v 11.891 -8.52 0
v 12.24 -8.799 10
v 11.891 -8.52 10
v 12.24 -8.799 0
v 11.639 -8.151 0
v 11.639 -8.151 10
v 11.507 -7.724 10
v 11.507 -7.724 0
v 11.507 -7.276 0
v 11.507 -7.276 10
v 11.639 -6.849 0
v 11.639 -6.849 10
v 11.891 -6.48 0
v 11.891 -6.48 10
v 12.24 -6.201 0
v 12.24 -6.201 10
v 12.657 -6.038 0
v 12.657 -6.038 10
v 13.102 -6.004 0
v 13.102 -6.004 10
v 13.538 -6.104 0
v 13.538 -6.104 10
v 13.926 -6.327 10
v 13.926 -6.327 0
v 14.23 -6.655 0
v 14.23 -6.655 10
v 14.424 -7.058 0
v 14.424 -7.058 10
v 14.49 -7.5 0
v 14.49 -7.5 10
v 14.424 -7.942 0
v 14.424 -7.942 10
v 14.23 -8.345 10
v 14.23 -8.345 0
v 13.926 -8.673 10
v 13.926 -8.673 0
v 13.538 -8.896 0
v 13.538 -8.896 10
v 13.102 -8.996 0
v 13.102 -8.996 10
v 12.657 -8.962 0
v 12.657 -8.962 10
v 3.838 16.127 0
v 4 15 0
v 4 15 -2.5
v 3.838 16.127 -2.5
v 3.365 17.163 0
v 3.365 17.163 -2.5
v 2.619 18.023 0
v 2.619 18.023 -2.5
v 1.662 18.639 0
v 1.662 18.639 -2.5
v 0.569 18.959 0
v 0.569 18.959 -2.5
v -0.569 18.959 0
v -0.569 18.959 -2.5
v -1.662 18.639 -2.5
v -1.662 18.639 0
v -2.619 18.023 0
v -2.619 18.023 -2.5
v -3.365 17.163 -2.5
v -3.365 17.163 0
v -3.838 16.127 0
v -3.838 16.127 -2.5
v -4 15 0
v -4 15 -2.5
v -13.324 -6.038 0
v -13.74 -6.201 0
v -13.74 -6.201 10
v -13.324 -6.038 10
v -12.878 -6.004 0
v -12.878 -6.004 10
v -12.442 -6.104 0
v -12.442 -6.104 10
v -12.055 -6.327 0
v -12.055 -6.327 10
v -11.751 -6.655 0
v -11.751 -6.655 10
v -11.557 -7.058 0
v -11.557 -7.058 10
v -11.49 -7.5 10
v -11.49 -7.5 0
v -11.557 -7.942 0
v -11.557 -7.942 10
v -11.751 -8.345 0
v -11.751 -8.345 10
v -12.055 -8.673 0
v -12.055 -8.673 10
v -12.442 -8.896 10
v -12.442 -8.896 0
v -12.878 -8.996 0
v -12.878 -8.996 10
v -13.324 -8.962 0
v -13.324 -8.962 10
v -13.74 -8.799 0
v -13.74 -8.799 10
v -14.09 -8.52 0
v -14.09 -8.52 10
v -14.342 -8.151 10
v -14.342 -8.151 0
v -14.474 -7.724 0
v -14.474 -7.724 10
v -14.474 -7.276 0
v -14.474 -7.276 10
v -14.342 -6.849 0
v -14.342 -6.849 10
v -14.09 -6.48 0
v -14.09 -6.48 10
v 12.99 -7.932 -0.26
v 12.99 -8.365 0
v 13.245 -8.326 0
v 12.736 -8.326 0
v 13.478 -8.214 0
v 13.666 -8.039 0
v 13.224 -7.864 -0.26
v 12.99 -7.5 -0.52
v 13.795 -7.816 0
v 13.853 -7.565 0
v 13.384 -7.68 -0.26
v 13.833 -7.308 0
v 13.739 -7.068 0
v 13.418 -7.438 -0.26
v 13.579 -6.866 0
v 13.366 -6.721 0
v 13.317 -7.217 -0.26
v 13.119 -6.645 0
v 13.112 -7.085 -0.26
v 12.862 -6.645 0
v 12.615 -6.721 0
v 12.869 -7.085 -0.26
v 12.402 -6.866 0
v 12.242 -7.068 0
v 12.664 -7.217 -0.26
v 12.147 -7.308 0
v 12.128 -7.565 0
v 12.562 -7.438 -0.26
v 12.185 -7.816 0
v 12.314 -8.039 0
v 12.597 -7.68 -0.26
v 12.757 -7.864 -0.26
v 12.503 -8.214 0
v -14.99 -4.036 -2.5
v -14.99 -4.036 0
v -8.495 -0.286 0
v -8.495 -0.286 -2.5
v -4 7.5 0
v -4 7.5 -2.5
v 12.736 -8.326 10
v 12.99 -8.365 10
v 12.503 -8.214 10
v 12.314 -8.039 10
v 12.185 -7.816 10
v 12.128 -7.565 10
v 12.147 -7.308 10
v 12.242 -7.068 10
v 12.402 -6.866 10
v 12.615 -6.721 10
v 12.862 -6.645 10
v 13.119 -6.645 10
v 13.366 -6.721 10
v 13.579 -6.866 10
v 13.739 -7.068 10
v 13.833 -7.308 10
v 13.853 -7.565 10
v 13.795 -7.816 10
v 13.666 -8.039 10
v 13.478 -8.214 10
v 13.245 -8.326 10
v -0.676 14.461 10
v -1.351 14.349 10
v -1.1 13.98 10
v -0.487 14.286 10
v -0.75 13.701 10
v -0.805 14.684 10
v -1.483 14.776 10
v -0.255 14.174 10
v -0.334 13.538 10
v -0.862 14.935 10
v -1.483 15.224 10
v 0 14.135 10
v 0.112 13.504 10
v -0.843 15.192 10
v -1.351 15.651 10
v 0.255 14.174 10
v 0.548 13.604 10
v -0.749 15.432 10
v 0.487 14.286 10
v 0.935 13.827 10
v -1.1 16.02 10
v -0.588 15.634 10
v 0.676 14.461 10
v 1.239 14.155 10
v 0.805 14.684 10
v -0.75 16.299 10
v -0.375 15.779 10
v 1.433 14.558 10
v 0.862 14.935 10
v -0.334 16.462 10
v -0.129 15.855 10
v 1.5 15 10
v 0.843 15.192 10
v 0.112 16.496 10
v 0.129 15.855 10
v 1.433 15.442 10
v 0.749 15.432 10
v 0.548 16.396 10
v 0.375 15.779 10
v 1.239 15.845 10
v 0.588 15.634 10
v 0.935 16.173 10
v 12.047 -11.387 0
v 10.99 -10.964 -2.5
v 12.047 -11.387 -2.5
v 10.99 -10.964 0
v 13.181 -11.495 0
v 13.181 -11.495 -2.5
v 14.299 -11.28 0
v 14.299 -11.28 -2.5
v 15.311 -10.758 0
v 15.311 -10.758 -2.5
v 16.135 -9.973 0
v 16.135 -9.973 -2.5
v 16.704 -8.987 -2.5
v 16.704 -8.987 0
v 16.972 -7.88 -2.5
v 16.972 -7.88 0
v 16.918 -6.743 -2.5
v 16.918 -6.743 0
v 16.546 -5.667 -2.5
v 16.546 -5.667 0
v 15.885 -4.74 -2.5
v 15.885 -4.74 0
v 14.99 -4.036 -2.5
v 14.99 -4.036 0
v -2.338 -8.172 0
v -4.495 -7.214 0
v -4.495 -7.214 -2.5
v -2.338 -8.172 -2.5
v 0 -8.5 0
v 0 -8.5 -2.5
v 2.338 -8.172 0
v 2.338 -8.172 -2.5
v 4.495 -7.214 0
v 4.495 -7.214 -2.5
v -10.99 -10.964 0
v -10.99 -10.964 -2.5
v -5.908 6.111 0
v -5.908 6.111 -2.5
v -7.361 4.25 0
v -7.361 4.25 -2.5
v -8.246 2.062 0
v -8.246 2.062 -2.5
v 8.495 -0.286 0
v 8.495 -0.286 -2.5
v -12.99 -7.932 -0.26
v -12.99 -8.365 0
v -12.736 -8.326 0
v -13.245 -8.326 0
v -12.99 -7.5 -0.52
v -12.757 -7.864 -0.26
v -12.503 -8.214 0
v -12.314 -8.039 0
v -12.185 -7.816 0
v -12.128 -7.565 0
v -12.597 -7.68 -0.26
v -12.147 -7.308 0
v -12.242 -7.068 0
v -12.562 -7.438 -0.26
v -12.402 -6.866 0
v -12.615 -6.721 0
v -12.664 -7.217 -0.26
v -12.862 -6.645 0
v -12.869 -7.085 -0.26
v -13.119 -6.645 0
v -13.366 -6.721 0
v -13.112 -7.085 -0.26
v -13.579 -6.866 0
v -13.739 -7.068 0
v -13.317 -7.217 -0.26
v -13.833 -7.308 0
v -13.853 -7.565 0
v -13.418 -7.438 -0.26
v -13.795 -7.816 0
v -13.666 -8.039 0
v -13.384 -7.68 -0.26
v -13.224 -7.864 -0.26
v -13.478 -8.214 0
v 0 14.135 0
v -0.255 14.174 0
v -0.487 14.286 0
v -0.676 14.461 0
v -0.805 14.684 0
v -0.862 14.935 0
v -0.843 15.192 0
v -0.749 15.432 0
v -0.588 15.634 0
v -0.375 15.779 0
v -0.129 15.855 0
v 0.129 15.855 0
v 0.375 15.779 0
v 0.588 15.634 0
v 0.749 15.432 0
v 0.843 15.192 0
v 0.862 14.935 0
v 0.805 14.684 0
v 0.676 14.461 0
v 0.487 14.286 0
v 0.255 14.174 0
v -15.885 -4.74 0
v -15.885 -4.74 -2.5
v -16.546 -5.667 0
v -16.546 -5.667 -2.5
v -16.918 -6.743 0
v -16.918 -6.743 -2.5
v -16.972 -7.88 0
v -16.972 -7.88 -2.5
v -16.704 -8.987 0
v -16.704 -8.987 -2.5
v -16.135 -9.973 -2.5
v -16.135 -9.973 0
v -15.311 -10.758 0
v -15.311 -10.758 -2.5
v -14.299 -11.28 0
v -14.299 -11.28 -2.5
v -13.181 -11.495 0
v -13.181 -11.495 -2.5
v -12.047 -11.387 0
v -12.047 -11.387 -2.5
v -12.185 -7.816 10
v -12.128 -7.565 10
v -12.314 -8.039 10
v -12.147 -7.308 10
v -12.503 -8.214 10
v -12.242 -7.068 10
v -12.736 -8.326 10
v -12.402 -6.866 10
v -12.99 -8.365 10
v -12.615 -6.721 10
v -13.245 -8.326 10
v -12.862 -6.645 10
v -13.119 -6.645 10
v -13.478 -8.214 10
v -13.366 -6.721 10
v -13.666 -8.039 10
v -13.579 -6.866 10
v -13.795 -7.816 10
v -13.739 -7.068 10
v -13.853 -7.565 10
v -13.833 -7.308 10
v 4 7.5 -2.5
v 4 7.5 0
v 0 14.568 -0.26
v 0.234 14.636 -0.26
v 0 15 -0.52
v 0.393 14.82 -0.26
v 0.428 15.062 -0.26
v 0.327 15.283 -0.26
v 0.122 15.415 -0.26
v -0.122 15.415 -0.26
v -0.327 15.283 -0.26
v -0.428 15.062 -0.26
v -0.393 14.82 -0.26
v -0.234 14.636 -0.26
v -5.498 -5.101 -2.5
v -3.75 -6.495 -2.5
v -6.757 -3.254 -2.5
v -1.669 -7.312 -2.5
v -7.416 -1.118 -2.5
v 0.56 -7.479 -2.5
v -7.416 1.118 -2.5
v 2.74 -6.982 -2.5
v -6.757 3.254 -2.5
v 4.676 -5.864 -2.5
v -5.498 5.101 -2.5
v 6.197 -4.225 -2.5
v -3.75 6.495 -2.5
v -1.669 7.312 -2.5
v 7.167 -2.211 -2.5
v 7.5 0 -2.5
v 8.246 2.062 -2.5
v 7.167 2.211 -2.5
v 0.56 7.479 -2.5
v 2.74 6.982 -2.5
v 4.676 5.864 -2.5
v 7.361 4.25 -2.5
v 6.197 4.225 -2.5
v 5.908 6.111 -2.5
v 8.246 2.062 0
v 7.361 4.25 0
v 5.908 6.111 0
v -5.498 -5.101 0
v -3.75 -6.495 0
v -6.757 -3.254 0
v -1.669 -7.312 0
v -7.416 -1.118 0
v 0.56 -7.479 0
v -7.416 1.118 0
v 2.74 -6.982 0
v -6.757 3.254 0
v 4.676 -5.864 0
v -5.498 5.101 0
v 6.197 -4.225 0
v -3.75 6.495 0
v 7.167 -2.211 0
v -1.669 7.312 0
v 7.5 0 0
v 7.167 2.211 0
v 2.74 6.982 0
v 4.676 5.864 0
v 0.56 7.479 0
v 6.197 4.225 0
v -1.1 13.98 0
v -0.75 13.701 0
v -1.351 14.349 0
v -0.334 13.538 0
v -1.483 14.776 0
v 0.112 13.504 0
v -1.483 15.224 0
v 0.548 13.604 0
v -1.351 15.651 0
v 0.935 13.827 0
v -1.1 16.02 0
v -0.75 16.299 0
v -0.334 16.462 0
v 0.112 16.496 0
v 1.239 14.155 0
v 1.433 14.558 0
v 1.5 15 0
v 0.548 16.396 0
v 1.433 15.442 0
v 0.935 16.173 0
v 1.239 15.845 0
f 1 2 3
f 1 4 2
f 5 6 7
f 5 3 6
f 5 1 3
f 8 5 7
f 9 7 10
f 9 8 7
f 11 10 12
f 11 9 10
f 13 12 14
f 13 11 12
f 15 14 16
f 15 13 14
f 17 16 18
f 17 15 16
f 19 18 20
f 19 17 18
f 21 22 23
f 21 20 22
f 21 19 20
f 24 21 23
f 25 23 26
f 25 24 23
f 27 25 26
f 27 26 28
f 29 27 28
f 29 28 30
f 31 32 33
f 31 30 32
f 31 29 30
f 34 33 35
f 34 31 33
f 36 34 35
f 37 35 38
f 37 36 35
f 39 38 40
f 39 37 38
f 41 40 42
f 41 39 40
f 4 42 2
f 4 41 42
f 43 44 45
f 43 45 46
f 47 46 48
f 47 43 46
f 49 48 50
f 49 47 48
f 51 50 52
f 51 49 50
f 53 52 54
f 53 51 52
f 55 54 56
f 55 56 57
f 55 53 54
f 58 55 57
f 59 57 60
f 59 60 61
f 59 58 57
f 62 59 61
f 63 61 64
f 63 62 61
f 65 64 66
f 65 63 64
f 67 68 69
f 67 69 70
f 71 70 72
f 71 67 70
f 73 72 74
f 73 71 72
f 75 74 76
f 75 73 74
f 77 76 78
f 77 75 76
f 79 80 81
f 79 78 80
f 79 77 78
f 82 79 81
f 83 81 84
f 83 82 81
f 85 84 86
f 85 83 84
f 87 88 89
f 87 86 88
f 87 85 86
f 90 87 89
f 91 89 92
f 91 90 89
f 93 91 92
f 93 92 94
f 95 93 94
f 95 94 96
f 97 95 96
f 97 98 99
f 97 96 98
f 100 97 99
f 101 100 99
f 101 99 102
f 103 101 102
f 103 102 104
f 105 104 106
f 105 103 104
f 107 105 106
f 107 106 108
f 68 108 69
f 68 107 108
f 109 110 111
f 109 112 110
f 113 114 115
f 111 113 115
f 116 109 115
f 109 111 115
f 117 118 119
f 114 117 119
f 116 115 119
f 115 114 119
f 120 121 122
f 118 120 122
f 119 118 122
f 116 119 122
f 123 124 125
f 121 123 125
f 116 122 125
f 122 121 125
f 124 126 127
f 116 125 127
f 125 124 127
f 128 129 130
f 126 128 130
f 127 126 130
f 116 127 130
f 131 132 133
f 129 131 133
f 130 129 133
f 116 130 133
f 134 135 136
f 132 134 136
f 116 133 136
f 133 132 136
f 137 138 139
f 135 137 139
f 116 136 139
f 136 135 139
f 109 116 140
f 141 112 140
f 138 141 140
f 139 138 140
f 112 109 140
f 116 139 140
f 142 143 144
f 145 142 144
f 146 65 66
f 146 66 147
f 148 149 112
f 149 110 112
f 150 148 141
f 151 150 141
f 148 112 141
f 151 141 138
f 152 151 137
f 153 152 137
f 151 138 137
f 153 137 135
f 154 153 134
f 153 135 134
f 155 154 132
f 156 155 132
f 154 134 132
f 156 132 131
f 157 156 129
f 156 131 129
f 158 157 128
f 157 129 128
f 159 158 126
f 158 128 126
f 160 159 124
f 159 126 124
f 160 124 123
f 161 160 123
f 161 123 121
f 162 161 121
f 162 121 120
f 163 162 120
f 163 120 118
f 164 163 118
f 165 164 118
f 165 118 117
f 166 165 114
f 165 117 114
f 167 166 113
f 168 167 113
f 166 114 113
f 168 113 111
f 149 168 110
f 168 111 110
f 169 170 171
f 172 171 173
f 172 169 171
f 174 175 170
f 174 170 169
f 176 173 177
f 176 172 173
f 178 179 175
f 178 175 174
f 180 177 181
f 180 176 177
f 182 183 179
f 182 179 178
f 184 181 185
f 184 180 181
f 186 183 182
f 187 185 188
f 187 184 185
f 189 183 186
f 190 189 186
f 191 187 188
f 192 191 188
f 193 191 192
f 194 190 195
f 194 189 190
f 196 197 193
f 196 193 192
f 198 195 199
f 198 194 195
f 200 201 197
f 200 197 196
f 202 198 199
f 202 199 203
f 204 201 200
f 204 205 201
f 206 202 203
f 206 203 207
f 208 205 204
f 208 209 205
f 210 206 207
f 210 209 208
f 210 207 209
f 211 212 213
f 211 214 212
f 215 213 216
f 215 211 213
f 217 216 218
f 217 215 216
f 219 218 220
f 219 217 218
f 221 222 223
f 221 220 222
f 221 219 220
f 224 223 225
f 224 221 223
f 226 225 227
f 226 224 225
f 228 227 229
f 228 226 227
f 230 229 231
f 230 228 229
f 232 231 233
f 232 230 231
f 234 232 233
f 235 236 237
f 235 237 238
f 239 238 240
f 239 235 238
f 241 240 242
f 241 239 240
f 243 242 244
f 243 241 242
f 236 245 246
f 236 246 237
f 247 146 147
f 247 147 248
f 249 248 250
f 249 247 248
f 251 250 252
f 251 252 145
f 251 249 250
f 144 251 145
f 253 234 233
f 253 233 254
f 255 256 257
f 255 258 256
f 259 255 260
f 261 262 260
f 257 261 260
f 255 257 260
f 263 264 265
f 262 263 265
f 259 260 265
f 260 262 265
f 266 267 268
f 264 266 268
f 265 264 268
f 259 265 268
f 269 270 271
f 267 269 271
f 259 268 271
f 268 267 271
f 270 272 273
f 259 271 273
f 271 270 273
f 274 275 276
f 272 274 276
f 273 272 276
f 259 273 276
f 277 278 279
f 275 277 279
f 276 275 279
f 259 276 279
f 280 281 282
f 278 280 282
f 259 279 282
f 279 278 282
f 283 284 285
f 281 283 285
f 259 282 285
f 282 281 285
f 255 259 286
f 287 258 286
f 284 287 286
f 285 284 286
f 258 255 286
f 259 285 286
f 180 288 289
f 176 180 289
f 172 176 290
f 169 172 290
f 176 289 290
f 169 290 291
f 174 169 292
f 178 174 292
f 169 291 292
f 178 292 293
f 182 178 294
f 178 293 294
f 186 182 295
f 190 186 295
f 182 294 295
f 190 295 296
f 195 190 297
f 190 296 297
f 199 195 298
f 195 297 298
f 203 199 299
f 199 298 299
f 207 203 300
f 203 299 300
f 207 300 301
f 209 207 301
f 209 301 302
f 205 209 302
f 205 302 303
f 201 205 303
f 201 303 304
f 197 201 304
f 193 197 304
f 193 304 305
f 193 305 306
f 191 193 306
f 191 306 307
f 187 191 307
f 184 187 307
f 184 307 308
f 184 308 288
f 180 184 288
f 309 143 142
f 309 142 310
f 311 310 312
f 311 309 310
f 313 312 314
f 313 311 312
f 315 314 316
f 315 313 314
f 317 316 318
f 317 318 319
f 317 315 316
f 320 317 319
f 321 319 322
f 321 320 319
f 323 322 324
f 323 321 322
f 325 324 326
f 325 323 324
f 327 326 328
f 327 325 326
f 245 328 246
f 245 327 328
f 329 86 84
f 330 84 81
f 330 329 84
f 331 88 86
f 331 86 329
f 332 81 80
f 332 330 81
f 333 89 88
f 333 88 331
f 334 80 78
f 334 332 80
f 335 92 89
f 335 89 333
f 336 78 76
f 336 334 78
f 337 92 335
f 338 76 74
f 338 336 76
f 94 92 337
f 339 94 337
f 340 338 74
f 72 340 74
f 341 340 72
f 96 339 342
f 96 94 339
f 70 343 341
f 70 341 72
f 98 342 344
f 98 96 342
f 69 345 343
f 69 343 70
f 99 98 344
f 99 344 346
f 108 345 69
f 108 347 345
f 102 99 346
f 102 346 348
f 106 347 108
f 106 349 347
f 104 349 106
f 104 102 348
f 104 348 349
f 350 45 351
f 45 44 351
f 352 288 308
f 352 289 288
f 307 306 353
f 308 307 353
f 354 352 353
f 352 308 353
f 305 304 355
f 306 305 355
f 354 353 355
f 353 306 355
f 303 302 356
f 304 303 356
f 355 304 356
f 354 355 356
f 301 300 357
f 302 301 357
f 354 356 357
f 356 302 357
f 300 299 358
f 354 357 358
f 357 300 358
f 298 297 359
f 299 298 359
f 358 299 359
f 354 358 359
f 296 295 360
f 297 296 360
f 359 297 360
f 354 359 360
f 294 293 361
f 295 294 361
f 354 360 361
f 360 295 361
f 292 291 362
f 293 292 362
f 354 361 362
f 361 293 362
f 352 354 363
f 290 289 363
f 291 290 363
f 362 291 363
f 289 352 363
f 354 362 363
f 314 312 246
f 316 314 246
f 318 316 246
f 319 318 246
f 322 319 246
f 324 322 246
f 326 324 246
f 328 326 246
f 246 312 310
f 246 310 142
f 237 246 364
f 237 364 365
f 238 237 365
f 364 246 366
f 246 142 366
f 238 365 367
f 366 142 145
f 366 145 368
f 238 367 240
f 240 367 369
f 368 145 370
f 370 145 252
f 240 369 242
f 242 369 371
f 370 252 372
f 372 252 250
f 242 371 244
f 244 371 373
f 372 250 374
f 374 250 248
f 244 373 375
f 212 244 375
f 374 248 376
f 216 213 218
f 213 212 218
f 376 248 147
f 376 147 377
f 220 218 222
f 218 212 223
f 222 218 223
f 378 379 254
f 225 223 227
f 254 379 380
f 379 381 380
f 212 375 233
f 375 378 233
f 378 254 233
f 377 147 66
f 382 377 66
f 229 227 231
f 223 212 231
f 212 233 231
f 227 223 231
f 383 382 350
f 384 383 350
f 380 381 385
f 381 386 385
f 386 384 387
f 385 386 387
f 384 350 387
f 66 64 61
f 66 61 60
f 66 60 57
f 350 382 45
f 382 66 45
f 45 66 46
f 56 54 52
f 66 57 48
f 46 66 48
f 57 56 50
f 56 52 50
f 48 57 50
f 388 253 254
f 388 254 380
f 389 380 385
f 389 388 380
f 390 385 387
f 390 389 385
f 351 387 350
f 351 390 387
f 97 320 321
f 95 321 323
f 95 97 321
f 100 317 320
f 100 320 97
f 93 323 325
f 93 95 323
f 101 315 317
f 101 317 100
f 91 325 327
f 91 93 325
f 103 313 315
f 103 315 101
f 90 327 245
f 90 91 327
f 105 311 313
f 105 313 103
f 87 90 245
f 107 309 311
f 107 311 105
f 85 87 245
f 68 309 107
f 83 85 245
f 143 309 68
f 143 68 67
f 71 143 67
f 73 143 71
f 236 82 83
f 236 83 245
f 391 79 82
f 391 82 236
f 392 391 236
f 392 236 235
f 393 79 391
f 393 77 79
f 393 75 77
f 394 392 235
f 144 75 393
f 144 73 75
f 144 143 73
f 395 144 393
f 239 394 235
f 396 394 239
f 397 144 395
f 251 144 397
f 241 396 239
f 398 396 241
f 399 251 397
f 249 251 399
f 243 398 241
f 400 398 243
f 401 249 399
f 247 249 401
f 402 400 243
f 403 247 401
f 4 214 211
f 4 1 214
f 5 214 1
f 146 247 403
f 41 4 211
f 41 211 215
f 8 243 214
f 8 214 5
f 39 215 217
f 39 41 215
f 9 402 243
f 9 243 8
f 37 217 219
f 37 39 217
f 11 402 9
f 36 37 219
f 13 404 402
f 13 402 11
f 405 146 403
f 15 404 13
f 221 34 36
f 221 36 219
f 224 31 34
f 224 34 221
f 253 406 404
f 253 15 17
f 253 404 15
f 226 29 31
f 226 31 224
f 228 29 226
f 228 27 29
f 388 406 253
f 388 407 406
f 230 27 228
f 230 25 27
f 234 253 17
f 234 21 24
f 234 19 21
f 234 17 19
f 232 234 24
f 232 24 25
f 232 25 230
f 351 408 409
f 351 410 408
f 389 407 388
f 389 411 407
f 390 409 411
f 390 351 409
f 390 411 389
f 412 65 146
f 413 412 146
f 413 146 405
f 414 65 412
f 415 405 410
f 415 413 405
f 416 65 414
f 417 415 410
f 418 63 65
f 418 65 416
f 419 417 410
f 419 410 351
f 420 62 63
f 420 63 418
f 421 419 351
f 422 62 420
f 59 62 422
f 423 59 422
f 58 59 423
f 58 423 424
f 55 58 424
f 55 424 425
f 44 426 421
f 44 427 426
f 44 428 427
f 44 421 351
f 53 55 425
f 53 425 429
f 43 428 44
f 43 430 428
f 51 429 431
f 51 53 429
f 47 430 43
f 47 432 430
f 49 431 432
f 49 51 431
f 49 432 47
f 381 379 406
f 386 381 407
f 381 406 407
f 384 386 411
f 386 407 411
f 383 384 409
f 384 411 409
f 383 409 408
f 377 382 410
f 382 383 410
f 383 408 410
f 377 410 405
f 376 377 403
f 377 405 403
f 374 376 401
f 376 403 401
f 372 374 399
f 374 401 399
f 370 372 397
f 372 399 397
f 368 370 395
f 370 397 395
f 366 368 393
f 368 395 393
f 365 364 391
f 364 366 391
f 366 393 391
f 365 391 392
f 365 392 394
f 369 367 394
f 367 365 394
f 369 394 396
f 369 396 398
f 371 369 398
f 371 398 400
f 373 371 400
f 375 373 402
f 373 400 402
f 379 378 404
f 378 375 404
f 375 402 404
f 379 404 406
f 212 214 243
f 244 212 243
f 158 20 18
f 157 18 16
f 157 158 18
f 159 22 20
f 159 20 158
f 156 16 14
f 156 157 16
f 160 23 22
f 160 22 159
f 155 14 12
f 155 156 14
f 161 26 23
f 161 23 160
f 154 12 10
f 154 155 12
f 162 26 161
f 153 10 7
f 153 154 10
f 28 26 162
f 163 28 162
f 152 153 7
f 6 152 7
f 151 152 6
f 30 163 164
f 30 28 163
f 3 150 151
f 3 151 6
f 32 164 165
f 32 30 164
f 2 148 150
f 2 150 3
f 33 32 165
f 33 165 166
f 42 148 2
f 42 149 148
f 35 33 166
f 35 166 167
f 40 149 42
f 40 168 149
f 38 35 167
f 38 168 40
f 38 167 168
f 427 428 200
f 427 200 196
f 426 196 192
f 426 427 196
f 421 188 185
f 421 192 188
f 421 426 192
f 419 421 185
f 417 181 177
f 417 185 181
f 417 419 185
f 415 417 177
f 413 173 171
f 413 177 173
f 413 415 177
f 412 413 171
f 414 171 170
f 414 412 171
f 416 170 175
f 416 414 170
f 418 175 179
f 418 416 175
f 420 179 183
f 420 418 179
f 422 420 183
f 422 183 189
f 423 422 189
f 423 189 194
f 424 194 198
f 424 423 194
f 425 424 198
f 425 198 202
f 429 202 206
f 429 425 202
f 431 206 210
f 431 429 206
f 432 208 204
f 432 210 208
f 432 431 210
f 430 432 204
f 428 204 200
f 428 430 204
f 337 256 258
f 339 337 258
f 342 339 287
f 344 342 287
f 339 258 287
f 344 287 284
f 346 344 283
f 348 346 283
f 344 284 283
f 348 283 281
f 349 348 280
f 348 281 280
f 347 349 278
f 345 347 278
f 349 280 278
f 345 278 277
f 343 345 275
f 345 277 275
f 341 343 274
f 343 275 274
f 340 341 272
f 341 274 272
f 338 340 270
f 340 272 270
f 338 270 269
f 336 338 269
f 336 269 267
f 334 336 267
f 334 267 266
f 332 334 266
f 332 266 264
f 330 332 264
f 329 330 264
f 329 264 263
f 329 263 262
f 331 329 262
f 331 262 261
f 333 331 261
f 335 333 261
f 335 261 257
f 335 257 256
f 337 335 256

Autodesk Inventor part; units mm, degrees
ref_plane "YZ Plane" through (0, 0, 0) normal (1, 0, 0) x (0, 1, 0)
ref_plane "XZ Plane" through (0, 0, 0) normal (0, 1, 0) x (-1, 0, 0)
ref_plane "XY Plane" through (0, 0, 0) normal (0, 0, 1) x (1, 0, 0)
sketch "Sketch3" plane through (0, 0, 0) normal (0, 0, 1) x (1, 0, 0)
  circle A0 centre (0, 0) radius 7.5
  circle A1 centre (0, 15) radius 4
  line L0 (0, 0) -> (0, 15)
  line L1 (-4, 15) -> (-4, 6.3443)
  line L2 (4, 15) -> (4, 6.3443)
  circle A2 centre (0, 0) radius 8.5
  circle A3 centre (-12.9904, -7.5) radius 4
  line L3 (-14.9904, -4.0359) -> (-7.4943, 0.292)
  line L4 (-10.9904, -10.9641) -> (-3.4943, -6.6362)
  circle A4 centre (12.9904, -7.5) radius 4
  line L5 (10.9904, -10.9641) -> (3.4943, -6.6362)
  line L6 (14.9904, -4.0359) -> (7.4943, 0.292)
  point P0 (-4, 7.5)
  point P1 (4, 7.5)
  point P2 (8.4952, -0.2859)
  point P3 (4.4952, -7.2141)
  point P4 (-4.4952, -7.2141)
  point P5 (-8.4952, -0.2859)
  dimension "d13" = 15
  dimension "d14" = 8
  dimension "d17" = 15
  dimension "d26" = 17
  dimension "d29" = 360
extrude "Extrusion3" add sketch "Sketch3" against normal blind 2.5 contours A0 L6 A2 L5 | A0 L2 A2 L6 | L5 A2 L4 A0 | A0 L0 A2 L2 | L6 A4 L5 A2 | L4 A2 L3 A0 | A0 L1 A2 L0 | A2 L0 A1 L2 | A4 | L3 A2 L1 A0 | L4 A3 L3 A2 | A2 L1 A1 L0 | A1 | A3
sketch "Sketch4" plane through (0, 0, 0) normal (0, 0, 1) x (1, 0, 0)
  arc A0 (4, 15) -> (-4, 15) centre (0, 15) ccw projected
  circle A1 centre (0, 15) radius 1.5
  point P0 (0, 0)
  dimension "d20" = 3
extrude "Extrusion4" add sketch "Sketch4" along normal blind 10
sketch "Sketch5" plane through (0, 0, 0) normal (0, 0, 1) x (1, 0, 0)
  circle A0 centre (0, 0) radius 7.5
  dimension "d23" = 15
pattern_circular "Circular Pattern1" count 3 over 360 about axis through (0, 0, -10) along (0, 0, 1) of "Extrusion4"
sketch "Sketch6" plane through (0, 15, 10) normal (0, 0, 1) x (1, 0, 0)
  circle A0 centre (0, 0) radius 1.5 projected
  circle A1 centre (-12.9904, -22.5) radius 1.5 projected
  circle A2 centre (12.9904, -22.5) radius 1.5 projected
  point P0 (0, -15)
hole "Hole1" at (0, 15, 10) at (-12.9904, -7.5, 10) at (12.9904, -7.5, 10) direction (0, 0, -1) diameter 1.7294 depth 10 tip angle 118 thread size "M2x0.25" class "6H" standard "ISO Metric profile"
properties part number "Planetery gearbox port"
